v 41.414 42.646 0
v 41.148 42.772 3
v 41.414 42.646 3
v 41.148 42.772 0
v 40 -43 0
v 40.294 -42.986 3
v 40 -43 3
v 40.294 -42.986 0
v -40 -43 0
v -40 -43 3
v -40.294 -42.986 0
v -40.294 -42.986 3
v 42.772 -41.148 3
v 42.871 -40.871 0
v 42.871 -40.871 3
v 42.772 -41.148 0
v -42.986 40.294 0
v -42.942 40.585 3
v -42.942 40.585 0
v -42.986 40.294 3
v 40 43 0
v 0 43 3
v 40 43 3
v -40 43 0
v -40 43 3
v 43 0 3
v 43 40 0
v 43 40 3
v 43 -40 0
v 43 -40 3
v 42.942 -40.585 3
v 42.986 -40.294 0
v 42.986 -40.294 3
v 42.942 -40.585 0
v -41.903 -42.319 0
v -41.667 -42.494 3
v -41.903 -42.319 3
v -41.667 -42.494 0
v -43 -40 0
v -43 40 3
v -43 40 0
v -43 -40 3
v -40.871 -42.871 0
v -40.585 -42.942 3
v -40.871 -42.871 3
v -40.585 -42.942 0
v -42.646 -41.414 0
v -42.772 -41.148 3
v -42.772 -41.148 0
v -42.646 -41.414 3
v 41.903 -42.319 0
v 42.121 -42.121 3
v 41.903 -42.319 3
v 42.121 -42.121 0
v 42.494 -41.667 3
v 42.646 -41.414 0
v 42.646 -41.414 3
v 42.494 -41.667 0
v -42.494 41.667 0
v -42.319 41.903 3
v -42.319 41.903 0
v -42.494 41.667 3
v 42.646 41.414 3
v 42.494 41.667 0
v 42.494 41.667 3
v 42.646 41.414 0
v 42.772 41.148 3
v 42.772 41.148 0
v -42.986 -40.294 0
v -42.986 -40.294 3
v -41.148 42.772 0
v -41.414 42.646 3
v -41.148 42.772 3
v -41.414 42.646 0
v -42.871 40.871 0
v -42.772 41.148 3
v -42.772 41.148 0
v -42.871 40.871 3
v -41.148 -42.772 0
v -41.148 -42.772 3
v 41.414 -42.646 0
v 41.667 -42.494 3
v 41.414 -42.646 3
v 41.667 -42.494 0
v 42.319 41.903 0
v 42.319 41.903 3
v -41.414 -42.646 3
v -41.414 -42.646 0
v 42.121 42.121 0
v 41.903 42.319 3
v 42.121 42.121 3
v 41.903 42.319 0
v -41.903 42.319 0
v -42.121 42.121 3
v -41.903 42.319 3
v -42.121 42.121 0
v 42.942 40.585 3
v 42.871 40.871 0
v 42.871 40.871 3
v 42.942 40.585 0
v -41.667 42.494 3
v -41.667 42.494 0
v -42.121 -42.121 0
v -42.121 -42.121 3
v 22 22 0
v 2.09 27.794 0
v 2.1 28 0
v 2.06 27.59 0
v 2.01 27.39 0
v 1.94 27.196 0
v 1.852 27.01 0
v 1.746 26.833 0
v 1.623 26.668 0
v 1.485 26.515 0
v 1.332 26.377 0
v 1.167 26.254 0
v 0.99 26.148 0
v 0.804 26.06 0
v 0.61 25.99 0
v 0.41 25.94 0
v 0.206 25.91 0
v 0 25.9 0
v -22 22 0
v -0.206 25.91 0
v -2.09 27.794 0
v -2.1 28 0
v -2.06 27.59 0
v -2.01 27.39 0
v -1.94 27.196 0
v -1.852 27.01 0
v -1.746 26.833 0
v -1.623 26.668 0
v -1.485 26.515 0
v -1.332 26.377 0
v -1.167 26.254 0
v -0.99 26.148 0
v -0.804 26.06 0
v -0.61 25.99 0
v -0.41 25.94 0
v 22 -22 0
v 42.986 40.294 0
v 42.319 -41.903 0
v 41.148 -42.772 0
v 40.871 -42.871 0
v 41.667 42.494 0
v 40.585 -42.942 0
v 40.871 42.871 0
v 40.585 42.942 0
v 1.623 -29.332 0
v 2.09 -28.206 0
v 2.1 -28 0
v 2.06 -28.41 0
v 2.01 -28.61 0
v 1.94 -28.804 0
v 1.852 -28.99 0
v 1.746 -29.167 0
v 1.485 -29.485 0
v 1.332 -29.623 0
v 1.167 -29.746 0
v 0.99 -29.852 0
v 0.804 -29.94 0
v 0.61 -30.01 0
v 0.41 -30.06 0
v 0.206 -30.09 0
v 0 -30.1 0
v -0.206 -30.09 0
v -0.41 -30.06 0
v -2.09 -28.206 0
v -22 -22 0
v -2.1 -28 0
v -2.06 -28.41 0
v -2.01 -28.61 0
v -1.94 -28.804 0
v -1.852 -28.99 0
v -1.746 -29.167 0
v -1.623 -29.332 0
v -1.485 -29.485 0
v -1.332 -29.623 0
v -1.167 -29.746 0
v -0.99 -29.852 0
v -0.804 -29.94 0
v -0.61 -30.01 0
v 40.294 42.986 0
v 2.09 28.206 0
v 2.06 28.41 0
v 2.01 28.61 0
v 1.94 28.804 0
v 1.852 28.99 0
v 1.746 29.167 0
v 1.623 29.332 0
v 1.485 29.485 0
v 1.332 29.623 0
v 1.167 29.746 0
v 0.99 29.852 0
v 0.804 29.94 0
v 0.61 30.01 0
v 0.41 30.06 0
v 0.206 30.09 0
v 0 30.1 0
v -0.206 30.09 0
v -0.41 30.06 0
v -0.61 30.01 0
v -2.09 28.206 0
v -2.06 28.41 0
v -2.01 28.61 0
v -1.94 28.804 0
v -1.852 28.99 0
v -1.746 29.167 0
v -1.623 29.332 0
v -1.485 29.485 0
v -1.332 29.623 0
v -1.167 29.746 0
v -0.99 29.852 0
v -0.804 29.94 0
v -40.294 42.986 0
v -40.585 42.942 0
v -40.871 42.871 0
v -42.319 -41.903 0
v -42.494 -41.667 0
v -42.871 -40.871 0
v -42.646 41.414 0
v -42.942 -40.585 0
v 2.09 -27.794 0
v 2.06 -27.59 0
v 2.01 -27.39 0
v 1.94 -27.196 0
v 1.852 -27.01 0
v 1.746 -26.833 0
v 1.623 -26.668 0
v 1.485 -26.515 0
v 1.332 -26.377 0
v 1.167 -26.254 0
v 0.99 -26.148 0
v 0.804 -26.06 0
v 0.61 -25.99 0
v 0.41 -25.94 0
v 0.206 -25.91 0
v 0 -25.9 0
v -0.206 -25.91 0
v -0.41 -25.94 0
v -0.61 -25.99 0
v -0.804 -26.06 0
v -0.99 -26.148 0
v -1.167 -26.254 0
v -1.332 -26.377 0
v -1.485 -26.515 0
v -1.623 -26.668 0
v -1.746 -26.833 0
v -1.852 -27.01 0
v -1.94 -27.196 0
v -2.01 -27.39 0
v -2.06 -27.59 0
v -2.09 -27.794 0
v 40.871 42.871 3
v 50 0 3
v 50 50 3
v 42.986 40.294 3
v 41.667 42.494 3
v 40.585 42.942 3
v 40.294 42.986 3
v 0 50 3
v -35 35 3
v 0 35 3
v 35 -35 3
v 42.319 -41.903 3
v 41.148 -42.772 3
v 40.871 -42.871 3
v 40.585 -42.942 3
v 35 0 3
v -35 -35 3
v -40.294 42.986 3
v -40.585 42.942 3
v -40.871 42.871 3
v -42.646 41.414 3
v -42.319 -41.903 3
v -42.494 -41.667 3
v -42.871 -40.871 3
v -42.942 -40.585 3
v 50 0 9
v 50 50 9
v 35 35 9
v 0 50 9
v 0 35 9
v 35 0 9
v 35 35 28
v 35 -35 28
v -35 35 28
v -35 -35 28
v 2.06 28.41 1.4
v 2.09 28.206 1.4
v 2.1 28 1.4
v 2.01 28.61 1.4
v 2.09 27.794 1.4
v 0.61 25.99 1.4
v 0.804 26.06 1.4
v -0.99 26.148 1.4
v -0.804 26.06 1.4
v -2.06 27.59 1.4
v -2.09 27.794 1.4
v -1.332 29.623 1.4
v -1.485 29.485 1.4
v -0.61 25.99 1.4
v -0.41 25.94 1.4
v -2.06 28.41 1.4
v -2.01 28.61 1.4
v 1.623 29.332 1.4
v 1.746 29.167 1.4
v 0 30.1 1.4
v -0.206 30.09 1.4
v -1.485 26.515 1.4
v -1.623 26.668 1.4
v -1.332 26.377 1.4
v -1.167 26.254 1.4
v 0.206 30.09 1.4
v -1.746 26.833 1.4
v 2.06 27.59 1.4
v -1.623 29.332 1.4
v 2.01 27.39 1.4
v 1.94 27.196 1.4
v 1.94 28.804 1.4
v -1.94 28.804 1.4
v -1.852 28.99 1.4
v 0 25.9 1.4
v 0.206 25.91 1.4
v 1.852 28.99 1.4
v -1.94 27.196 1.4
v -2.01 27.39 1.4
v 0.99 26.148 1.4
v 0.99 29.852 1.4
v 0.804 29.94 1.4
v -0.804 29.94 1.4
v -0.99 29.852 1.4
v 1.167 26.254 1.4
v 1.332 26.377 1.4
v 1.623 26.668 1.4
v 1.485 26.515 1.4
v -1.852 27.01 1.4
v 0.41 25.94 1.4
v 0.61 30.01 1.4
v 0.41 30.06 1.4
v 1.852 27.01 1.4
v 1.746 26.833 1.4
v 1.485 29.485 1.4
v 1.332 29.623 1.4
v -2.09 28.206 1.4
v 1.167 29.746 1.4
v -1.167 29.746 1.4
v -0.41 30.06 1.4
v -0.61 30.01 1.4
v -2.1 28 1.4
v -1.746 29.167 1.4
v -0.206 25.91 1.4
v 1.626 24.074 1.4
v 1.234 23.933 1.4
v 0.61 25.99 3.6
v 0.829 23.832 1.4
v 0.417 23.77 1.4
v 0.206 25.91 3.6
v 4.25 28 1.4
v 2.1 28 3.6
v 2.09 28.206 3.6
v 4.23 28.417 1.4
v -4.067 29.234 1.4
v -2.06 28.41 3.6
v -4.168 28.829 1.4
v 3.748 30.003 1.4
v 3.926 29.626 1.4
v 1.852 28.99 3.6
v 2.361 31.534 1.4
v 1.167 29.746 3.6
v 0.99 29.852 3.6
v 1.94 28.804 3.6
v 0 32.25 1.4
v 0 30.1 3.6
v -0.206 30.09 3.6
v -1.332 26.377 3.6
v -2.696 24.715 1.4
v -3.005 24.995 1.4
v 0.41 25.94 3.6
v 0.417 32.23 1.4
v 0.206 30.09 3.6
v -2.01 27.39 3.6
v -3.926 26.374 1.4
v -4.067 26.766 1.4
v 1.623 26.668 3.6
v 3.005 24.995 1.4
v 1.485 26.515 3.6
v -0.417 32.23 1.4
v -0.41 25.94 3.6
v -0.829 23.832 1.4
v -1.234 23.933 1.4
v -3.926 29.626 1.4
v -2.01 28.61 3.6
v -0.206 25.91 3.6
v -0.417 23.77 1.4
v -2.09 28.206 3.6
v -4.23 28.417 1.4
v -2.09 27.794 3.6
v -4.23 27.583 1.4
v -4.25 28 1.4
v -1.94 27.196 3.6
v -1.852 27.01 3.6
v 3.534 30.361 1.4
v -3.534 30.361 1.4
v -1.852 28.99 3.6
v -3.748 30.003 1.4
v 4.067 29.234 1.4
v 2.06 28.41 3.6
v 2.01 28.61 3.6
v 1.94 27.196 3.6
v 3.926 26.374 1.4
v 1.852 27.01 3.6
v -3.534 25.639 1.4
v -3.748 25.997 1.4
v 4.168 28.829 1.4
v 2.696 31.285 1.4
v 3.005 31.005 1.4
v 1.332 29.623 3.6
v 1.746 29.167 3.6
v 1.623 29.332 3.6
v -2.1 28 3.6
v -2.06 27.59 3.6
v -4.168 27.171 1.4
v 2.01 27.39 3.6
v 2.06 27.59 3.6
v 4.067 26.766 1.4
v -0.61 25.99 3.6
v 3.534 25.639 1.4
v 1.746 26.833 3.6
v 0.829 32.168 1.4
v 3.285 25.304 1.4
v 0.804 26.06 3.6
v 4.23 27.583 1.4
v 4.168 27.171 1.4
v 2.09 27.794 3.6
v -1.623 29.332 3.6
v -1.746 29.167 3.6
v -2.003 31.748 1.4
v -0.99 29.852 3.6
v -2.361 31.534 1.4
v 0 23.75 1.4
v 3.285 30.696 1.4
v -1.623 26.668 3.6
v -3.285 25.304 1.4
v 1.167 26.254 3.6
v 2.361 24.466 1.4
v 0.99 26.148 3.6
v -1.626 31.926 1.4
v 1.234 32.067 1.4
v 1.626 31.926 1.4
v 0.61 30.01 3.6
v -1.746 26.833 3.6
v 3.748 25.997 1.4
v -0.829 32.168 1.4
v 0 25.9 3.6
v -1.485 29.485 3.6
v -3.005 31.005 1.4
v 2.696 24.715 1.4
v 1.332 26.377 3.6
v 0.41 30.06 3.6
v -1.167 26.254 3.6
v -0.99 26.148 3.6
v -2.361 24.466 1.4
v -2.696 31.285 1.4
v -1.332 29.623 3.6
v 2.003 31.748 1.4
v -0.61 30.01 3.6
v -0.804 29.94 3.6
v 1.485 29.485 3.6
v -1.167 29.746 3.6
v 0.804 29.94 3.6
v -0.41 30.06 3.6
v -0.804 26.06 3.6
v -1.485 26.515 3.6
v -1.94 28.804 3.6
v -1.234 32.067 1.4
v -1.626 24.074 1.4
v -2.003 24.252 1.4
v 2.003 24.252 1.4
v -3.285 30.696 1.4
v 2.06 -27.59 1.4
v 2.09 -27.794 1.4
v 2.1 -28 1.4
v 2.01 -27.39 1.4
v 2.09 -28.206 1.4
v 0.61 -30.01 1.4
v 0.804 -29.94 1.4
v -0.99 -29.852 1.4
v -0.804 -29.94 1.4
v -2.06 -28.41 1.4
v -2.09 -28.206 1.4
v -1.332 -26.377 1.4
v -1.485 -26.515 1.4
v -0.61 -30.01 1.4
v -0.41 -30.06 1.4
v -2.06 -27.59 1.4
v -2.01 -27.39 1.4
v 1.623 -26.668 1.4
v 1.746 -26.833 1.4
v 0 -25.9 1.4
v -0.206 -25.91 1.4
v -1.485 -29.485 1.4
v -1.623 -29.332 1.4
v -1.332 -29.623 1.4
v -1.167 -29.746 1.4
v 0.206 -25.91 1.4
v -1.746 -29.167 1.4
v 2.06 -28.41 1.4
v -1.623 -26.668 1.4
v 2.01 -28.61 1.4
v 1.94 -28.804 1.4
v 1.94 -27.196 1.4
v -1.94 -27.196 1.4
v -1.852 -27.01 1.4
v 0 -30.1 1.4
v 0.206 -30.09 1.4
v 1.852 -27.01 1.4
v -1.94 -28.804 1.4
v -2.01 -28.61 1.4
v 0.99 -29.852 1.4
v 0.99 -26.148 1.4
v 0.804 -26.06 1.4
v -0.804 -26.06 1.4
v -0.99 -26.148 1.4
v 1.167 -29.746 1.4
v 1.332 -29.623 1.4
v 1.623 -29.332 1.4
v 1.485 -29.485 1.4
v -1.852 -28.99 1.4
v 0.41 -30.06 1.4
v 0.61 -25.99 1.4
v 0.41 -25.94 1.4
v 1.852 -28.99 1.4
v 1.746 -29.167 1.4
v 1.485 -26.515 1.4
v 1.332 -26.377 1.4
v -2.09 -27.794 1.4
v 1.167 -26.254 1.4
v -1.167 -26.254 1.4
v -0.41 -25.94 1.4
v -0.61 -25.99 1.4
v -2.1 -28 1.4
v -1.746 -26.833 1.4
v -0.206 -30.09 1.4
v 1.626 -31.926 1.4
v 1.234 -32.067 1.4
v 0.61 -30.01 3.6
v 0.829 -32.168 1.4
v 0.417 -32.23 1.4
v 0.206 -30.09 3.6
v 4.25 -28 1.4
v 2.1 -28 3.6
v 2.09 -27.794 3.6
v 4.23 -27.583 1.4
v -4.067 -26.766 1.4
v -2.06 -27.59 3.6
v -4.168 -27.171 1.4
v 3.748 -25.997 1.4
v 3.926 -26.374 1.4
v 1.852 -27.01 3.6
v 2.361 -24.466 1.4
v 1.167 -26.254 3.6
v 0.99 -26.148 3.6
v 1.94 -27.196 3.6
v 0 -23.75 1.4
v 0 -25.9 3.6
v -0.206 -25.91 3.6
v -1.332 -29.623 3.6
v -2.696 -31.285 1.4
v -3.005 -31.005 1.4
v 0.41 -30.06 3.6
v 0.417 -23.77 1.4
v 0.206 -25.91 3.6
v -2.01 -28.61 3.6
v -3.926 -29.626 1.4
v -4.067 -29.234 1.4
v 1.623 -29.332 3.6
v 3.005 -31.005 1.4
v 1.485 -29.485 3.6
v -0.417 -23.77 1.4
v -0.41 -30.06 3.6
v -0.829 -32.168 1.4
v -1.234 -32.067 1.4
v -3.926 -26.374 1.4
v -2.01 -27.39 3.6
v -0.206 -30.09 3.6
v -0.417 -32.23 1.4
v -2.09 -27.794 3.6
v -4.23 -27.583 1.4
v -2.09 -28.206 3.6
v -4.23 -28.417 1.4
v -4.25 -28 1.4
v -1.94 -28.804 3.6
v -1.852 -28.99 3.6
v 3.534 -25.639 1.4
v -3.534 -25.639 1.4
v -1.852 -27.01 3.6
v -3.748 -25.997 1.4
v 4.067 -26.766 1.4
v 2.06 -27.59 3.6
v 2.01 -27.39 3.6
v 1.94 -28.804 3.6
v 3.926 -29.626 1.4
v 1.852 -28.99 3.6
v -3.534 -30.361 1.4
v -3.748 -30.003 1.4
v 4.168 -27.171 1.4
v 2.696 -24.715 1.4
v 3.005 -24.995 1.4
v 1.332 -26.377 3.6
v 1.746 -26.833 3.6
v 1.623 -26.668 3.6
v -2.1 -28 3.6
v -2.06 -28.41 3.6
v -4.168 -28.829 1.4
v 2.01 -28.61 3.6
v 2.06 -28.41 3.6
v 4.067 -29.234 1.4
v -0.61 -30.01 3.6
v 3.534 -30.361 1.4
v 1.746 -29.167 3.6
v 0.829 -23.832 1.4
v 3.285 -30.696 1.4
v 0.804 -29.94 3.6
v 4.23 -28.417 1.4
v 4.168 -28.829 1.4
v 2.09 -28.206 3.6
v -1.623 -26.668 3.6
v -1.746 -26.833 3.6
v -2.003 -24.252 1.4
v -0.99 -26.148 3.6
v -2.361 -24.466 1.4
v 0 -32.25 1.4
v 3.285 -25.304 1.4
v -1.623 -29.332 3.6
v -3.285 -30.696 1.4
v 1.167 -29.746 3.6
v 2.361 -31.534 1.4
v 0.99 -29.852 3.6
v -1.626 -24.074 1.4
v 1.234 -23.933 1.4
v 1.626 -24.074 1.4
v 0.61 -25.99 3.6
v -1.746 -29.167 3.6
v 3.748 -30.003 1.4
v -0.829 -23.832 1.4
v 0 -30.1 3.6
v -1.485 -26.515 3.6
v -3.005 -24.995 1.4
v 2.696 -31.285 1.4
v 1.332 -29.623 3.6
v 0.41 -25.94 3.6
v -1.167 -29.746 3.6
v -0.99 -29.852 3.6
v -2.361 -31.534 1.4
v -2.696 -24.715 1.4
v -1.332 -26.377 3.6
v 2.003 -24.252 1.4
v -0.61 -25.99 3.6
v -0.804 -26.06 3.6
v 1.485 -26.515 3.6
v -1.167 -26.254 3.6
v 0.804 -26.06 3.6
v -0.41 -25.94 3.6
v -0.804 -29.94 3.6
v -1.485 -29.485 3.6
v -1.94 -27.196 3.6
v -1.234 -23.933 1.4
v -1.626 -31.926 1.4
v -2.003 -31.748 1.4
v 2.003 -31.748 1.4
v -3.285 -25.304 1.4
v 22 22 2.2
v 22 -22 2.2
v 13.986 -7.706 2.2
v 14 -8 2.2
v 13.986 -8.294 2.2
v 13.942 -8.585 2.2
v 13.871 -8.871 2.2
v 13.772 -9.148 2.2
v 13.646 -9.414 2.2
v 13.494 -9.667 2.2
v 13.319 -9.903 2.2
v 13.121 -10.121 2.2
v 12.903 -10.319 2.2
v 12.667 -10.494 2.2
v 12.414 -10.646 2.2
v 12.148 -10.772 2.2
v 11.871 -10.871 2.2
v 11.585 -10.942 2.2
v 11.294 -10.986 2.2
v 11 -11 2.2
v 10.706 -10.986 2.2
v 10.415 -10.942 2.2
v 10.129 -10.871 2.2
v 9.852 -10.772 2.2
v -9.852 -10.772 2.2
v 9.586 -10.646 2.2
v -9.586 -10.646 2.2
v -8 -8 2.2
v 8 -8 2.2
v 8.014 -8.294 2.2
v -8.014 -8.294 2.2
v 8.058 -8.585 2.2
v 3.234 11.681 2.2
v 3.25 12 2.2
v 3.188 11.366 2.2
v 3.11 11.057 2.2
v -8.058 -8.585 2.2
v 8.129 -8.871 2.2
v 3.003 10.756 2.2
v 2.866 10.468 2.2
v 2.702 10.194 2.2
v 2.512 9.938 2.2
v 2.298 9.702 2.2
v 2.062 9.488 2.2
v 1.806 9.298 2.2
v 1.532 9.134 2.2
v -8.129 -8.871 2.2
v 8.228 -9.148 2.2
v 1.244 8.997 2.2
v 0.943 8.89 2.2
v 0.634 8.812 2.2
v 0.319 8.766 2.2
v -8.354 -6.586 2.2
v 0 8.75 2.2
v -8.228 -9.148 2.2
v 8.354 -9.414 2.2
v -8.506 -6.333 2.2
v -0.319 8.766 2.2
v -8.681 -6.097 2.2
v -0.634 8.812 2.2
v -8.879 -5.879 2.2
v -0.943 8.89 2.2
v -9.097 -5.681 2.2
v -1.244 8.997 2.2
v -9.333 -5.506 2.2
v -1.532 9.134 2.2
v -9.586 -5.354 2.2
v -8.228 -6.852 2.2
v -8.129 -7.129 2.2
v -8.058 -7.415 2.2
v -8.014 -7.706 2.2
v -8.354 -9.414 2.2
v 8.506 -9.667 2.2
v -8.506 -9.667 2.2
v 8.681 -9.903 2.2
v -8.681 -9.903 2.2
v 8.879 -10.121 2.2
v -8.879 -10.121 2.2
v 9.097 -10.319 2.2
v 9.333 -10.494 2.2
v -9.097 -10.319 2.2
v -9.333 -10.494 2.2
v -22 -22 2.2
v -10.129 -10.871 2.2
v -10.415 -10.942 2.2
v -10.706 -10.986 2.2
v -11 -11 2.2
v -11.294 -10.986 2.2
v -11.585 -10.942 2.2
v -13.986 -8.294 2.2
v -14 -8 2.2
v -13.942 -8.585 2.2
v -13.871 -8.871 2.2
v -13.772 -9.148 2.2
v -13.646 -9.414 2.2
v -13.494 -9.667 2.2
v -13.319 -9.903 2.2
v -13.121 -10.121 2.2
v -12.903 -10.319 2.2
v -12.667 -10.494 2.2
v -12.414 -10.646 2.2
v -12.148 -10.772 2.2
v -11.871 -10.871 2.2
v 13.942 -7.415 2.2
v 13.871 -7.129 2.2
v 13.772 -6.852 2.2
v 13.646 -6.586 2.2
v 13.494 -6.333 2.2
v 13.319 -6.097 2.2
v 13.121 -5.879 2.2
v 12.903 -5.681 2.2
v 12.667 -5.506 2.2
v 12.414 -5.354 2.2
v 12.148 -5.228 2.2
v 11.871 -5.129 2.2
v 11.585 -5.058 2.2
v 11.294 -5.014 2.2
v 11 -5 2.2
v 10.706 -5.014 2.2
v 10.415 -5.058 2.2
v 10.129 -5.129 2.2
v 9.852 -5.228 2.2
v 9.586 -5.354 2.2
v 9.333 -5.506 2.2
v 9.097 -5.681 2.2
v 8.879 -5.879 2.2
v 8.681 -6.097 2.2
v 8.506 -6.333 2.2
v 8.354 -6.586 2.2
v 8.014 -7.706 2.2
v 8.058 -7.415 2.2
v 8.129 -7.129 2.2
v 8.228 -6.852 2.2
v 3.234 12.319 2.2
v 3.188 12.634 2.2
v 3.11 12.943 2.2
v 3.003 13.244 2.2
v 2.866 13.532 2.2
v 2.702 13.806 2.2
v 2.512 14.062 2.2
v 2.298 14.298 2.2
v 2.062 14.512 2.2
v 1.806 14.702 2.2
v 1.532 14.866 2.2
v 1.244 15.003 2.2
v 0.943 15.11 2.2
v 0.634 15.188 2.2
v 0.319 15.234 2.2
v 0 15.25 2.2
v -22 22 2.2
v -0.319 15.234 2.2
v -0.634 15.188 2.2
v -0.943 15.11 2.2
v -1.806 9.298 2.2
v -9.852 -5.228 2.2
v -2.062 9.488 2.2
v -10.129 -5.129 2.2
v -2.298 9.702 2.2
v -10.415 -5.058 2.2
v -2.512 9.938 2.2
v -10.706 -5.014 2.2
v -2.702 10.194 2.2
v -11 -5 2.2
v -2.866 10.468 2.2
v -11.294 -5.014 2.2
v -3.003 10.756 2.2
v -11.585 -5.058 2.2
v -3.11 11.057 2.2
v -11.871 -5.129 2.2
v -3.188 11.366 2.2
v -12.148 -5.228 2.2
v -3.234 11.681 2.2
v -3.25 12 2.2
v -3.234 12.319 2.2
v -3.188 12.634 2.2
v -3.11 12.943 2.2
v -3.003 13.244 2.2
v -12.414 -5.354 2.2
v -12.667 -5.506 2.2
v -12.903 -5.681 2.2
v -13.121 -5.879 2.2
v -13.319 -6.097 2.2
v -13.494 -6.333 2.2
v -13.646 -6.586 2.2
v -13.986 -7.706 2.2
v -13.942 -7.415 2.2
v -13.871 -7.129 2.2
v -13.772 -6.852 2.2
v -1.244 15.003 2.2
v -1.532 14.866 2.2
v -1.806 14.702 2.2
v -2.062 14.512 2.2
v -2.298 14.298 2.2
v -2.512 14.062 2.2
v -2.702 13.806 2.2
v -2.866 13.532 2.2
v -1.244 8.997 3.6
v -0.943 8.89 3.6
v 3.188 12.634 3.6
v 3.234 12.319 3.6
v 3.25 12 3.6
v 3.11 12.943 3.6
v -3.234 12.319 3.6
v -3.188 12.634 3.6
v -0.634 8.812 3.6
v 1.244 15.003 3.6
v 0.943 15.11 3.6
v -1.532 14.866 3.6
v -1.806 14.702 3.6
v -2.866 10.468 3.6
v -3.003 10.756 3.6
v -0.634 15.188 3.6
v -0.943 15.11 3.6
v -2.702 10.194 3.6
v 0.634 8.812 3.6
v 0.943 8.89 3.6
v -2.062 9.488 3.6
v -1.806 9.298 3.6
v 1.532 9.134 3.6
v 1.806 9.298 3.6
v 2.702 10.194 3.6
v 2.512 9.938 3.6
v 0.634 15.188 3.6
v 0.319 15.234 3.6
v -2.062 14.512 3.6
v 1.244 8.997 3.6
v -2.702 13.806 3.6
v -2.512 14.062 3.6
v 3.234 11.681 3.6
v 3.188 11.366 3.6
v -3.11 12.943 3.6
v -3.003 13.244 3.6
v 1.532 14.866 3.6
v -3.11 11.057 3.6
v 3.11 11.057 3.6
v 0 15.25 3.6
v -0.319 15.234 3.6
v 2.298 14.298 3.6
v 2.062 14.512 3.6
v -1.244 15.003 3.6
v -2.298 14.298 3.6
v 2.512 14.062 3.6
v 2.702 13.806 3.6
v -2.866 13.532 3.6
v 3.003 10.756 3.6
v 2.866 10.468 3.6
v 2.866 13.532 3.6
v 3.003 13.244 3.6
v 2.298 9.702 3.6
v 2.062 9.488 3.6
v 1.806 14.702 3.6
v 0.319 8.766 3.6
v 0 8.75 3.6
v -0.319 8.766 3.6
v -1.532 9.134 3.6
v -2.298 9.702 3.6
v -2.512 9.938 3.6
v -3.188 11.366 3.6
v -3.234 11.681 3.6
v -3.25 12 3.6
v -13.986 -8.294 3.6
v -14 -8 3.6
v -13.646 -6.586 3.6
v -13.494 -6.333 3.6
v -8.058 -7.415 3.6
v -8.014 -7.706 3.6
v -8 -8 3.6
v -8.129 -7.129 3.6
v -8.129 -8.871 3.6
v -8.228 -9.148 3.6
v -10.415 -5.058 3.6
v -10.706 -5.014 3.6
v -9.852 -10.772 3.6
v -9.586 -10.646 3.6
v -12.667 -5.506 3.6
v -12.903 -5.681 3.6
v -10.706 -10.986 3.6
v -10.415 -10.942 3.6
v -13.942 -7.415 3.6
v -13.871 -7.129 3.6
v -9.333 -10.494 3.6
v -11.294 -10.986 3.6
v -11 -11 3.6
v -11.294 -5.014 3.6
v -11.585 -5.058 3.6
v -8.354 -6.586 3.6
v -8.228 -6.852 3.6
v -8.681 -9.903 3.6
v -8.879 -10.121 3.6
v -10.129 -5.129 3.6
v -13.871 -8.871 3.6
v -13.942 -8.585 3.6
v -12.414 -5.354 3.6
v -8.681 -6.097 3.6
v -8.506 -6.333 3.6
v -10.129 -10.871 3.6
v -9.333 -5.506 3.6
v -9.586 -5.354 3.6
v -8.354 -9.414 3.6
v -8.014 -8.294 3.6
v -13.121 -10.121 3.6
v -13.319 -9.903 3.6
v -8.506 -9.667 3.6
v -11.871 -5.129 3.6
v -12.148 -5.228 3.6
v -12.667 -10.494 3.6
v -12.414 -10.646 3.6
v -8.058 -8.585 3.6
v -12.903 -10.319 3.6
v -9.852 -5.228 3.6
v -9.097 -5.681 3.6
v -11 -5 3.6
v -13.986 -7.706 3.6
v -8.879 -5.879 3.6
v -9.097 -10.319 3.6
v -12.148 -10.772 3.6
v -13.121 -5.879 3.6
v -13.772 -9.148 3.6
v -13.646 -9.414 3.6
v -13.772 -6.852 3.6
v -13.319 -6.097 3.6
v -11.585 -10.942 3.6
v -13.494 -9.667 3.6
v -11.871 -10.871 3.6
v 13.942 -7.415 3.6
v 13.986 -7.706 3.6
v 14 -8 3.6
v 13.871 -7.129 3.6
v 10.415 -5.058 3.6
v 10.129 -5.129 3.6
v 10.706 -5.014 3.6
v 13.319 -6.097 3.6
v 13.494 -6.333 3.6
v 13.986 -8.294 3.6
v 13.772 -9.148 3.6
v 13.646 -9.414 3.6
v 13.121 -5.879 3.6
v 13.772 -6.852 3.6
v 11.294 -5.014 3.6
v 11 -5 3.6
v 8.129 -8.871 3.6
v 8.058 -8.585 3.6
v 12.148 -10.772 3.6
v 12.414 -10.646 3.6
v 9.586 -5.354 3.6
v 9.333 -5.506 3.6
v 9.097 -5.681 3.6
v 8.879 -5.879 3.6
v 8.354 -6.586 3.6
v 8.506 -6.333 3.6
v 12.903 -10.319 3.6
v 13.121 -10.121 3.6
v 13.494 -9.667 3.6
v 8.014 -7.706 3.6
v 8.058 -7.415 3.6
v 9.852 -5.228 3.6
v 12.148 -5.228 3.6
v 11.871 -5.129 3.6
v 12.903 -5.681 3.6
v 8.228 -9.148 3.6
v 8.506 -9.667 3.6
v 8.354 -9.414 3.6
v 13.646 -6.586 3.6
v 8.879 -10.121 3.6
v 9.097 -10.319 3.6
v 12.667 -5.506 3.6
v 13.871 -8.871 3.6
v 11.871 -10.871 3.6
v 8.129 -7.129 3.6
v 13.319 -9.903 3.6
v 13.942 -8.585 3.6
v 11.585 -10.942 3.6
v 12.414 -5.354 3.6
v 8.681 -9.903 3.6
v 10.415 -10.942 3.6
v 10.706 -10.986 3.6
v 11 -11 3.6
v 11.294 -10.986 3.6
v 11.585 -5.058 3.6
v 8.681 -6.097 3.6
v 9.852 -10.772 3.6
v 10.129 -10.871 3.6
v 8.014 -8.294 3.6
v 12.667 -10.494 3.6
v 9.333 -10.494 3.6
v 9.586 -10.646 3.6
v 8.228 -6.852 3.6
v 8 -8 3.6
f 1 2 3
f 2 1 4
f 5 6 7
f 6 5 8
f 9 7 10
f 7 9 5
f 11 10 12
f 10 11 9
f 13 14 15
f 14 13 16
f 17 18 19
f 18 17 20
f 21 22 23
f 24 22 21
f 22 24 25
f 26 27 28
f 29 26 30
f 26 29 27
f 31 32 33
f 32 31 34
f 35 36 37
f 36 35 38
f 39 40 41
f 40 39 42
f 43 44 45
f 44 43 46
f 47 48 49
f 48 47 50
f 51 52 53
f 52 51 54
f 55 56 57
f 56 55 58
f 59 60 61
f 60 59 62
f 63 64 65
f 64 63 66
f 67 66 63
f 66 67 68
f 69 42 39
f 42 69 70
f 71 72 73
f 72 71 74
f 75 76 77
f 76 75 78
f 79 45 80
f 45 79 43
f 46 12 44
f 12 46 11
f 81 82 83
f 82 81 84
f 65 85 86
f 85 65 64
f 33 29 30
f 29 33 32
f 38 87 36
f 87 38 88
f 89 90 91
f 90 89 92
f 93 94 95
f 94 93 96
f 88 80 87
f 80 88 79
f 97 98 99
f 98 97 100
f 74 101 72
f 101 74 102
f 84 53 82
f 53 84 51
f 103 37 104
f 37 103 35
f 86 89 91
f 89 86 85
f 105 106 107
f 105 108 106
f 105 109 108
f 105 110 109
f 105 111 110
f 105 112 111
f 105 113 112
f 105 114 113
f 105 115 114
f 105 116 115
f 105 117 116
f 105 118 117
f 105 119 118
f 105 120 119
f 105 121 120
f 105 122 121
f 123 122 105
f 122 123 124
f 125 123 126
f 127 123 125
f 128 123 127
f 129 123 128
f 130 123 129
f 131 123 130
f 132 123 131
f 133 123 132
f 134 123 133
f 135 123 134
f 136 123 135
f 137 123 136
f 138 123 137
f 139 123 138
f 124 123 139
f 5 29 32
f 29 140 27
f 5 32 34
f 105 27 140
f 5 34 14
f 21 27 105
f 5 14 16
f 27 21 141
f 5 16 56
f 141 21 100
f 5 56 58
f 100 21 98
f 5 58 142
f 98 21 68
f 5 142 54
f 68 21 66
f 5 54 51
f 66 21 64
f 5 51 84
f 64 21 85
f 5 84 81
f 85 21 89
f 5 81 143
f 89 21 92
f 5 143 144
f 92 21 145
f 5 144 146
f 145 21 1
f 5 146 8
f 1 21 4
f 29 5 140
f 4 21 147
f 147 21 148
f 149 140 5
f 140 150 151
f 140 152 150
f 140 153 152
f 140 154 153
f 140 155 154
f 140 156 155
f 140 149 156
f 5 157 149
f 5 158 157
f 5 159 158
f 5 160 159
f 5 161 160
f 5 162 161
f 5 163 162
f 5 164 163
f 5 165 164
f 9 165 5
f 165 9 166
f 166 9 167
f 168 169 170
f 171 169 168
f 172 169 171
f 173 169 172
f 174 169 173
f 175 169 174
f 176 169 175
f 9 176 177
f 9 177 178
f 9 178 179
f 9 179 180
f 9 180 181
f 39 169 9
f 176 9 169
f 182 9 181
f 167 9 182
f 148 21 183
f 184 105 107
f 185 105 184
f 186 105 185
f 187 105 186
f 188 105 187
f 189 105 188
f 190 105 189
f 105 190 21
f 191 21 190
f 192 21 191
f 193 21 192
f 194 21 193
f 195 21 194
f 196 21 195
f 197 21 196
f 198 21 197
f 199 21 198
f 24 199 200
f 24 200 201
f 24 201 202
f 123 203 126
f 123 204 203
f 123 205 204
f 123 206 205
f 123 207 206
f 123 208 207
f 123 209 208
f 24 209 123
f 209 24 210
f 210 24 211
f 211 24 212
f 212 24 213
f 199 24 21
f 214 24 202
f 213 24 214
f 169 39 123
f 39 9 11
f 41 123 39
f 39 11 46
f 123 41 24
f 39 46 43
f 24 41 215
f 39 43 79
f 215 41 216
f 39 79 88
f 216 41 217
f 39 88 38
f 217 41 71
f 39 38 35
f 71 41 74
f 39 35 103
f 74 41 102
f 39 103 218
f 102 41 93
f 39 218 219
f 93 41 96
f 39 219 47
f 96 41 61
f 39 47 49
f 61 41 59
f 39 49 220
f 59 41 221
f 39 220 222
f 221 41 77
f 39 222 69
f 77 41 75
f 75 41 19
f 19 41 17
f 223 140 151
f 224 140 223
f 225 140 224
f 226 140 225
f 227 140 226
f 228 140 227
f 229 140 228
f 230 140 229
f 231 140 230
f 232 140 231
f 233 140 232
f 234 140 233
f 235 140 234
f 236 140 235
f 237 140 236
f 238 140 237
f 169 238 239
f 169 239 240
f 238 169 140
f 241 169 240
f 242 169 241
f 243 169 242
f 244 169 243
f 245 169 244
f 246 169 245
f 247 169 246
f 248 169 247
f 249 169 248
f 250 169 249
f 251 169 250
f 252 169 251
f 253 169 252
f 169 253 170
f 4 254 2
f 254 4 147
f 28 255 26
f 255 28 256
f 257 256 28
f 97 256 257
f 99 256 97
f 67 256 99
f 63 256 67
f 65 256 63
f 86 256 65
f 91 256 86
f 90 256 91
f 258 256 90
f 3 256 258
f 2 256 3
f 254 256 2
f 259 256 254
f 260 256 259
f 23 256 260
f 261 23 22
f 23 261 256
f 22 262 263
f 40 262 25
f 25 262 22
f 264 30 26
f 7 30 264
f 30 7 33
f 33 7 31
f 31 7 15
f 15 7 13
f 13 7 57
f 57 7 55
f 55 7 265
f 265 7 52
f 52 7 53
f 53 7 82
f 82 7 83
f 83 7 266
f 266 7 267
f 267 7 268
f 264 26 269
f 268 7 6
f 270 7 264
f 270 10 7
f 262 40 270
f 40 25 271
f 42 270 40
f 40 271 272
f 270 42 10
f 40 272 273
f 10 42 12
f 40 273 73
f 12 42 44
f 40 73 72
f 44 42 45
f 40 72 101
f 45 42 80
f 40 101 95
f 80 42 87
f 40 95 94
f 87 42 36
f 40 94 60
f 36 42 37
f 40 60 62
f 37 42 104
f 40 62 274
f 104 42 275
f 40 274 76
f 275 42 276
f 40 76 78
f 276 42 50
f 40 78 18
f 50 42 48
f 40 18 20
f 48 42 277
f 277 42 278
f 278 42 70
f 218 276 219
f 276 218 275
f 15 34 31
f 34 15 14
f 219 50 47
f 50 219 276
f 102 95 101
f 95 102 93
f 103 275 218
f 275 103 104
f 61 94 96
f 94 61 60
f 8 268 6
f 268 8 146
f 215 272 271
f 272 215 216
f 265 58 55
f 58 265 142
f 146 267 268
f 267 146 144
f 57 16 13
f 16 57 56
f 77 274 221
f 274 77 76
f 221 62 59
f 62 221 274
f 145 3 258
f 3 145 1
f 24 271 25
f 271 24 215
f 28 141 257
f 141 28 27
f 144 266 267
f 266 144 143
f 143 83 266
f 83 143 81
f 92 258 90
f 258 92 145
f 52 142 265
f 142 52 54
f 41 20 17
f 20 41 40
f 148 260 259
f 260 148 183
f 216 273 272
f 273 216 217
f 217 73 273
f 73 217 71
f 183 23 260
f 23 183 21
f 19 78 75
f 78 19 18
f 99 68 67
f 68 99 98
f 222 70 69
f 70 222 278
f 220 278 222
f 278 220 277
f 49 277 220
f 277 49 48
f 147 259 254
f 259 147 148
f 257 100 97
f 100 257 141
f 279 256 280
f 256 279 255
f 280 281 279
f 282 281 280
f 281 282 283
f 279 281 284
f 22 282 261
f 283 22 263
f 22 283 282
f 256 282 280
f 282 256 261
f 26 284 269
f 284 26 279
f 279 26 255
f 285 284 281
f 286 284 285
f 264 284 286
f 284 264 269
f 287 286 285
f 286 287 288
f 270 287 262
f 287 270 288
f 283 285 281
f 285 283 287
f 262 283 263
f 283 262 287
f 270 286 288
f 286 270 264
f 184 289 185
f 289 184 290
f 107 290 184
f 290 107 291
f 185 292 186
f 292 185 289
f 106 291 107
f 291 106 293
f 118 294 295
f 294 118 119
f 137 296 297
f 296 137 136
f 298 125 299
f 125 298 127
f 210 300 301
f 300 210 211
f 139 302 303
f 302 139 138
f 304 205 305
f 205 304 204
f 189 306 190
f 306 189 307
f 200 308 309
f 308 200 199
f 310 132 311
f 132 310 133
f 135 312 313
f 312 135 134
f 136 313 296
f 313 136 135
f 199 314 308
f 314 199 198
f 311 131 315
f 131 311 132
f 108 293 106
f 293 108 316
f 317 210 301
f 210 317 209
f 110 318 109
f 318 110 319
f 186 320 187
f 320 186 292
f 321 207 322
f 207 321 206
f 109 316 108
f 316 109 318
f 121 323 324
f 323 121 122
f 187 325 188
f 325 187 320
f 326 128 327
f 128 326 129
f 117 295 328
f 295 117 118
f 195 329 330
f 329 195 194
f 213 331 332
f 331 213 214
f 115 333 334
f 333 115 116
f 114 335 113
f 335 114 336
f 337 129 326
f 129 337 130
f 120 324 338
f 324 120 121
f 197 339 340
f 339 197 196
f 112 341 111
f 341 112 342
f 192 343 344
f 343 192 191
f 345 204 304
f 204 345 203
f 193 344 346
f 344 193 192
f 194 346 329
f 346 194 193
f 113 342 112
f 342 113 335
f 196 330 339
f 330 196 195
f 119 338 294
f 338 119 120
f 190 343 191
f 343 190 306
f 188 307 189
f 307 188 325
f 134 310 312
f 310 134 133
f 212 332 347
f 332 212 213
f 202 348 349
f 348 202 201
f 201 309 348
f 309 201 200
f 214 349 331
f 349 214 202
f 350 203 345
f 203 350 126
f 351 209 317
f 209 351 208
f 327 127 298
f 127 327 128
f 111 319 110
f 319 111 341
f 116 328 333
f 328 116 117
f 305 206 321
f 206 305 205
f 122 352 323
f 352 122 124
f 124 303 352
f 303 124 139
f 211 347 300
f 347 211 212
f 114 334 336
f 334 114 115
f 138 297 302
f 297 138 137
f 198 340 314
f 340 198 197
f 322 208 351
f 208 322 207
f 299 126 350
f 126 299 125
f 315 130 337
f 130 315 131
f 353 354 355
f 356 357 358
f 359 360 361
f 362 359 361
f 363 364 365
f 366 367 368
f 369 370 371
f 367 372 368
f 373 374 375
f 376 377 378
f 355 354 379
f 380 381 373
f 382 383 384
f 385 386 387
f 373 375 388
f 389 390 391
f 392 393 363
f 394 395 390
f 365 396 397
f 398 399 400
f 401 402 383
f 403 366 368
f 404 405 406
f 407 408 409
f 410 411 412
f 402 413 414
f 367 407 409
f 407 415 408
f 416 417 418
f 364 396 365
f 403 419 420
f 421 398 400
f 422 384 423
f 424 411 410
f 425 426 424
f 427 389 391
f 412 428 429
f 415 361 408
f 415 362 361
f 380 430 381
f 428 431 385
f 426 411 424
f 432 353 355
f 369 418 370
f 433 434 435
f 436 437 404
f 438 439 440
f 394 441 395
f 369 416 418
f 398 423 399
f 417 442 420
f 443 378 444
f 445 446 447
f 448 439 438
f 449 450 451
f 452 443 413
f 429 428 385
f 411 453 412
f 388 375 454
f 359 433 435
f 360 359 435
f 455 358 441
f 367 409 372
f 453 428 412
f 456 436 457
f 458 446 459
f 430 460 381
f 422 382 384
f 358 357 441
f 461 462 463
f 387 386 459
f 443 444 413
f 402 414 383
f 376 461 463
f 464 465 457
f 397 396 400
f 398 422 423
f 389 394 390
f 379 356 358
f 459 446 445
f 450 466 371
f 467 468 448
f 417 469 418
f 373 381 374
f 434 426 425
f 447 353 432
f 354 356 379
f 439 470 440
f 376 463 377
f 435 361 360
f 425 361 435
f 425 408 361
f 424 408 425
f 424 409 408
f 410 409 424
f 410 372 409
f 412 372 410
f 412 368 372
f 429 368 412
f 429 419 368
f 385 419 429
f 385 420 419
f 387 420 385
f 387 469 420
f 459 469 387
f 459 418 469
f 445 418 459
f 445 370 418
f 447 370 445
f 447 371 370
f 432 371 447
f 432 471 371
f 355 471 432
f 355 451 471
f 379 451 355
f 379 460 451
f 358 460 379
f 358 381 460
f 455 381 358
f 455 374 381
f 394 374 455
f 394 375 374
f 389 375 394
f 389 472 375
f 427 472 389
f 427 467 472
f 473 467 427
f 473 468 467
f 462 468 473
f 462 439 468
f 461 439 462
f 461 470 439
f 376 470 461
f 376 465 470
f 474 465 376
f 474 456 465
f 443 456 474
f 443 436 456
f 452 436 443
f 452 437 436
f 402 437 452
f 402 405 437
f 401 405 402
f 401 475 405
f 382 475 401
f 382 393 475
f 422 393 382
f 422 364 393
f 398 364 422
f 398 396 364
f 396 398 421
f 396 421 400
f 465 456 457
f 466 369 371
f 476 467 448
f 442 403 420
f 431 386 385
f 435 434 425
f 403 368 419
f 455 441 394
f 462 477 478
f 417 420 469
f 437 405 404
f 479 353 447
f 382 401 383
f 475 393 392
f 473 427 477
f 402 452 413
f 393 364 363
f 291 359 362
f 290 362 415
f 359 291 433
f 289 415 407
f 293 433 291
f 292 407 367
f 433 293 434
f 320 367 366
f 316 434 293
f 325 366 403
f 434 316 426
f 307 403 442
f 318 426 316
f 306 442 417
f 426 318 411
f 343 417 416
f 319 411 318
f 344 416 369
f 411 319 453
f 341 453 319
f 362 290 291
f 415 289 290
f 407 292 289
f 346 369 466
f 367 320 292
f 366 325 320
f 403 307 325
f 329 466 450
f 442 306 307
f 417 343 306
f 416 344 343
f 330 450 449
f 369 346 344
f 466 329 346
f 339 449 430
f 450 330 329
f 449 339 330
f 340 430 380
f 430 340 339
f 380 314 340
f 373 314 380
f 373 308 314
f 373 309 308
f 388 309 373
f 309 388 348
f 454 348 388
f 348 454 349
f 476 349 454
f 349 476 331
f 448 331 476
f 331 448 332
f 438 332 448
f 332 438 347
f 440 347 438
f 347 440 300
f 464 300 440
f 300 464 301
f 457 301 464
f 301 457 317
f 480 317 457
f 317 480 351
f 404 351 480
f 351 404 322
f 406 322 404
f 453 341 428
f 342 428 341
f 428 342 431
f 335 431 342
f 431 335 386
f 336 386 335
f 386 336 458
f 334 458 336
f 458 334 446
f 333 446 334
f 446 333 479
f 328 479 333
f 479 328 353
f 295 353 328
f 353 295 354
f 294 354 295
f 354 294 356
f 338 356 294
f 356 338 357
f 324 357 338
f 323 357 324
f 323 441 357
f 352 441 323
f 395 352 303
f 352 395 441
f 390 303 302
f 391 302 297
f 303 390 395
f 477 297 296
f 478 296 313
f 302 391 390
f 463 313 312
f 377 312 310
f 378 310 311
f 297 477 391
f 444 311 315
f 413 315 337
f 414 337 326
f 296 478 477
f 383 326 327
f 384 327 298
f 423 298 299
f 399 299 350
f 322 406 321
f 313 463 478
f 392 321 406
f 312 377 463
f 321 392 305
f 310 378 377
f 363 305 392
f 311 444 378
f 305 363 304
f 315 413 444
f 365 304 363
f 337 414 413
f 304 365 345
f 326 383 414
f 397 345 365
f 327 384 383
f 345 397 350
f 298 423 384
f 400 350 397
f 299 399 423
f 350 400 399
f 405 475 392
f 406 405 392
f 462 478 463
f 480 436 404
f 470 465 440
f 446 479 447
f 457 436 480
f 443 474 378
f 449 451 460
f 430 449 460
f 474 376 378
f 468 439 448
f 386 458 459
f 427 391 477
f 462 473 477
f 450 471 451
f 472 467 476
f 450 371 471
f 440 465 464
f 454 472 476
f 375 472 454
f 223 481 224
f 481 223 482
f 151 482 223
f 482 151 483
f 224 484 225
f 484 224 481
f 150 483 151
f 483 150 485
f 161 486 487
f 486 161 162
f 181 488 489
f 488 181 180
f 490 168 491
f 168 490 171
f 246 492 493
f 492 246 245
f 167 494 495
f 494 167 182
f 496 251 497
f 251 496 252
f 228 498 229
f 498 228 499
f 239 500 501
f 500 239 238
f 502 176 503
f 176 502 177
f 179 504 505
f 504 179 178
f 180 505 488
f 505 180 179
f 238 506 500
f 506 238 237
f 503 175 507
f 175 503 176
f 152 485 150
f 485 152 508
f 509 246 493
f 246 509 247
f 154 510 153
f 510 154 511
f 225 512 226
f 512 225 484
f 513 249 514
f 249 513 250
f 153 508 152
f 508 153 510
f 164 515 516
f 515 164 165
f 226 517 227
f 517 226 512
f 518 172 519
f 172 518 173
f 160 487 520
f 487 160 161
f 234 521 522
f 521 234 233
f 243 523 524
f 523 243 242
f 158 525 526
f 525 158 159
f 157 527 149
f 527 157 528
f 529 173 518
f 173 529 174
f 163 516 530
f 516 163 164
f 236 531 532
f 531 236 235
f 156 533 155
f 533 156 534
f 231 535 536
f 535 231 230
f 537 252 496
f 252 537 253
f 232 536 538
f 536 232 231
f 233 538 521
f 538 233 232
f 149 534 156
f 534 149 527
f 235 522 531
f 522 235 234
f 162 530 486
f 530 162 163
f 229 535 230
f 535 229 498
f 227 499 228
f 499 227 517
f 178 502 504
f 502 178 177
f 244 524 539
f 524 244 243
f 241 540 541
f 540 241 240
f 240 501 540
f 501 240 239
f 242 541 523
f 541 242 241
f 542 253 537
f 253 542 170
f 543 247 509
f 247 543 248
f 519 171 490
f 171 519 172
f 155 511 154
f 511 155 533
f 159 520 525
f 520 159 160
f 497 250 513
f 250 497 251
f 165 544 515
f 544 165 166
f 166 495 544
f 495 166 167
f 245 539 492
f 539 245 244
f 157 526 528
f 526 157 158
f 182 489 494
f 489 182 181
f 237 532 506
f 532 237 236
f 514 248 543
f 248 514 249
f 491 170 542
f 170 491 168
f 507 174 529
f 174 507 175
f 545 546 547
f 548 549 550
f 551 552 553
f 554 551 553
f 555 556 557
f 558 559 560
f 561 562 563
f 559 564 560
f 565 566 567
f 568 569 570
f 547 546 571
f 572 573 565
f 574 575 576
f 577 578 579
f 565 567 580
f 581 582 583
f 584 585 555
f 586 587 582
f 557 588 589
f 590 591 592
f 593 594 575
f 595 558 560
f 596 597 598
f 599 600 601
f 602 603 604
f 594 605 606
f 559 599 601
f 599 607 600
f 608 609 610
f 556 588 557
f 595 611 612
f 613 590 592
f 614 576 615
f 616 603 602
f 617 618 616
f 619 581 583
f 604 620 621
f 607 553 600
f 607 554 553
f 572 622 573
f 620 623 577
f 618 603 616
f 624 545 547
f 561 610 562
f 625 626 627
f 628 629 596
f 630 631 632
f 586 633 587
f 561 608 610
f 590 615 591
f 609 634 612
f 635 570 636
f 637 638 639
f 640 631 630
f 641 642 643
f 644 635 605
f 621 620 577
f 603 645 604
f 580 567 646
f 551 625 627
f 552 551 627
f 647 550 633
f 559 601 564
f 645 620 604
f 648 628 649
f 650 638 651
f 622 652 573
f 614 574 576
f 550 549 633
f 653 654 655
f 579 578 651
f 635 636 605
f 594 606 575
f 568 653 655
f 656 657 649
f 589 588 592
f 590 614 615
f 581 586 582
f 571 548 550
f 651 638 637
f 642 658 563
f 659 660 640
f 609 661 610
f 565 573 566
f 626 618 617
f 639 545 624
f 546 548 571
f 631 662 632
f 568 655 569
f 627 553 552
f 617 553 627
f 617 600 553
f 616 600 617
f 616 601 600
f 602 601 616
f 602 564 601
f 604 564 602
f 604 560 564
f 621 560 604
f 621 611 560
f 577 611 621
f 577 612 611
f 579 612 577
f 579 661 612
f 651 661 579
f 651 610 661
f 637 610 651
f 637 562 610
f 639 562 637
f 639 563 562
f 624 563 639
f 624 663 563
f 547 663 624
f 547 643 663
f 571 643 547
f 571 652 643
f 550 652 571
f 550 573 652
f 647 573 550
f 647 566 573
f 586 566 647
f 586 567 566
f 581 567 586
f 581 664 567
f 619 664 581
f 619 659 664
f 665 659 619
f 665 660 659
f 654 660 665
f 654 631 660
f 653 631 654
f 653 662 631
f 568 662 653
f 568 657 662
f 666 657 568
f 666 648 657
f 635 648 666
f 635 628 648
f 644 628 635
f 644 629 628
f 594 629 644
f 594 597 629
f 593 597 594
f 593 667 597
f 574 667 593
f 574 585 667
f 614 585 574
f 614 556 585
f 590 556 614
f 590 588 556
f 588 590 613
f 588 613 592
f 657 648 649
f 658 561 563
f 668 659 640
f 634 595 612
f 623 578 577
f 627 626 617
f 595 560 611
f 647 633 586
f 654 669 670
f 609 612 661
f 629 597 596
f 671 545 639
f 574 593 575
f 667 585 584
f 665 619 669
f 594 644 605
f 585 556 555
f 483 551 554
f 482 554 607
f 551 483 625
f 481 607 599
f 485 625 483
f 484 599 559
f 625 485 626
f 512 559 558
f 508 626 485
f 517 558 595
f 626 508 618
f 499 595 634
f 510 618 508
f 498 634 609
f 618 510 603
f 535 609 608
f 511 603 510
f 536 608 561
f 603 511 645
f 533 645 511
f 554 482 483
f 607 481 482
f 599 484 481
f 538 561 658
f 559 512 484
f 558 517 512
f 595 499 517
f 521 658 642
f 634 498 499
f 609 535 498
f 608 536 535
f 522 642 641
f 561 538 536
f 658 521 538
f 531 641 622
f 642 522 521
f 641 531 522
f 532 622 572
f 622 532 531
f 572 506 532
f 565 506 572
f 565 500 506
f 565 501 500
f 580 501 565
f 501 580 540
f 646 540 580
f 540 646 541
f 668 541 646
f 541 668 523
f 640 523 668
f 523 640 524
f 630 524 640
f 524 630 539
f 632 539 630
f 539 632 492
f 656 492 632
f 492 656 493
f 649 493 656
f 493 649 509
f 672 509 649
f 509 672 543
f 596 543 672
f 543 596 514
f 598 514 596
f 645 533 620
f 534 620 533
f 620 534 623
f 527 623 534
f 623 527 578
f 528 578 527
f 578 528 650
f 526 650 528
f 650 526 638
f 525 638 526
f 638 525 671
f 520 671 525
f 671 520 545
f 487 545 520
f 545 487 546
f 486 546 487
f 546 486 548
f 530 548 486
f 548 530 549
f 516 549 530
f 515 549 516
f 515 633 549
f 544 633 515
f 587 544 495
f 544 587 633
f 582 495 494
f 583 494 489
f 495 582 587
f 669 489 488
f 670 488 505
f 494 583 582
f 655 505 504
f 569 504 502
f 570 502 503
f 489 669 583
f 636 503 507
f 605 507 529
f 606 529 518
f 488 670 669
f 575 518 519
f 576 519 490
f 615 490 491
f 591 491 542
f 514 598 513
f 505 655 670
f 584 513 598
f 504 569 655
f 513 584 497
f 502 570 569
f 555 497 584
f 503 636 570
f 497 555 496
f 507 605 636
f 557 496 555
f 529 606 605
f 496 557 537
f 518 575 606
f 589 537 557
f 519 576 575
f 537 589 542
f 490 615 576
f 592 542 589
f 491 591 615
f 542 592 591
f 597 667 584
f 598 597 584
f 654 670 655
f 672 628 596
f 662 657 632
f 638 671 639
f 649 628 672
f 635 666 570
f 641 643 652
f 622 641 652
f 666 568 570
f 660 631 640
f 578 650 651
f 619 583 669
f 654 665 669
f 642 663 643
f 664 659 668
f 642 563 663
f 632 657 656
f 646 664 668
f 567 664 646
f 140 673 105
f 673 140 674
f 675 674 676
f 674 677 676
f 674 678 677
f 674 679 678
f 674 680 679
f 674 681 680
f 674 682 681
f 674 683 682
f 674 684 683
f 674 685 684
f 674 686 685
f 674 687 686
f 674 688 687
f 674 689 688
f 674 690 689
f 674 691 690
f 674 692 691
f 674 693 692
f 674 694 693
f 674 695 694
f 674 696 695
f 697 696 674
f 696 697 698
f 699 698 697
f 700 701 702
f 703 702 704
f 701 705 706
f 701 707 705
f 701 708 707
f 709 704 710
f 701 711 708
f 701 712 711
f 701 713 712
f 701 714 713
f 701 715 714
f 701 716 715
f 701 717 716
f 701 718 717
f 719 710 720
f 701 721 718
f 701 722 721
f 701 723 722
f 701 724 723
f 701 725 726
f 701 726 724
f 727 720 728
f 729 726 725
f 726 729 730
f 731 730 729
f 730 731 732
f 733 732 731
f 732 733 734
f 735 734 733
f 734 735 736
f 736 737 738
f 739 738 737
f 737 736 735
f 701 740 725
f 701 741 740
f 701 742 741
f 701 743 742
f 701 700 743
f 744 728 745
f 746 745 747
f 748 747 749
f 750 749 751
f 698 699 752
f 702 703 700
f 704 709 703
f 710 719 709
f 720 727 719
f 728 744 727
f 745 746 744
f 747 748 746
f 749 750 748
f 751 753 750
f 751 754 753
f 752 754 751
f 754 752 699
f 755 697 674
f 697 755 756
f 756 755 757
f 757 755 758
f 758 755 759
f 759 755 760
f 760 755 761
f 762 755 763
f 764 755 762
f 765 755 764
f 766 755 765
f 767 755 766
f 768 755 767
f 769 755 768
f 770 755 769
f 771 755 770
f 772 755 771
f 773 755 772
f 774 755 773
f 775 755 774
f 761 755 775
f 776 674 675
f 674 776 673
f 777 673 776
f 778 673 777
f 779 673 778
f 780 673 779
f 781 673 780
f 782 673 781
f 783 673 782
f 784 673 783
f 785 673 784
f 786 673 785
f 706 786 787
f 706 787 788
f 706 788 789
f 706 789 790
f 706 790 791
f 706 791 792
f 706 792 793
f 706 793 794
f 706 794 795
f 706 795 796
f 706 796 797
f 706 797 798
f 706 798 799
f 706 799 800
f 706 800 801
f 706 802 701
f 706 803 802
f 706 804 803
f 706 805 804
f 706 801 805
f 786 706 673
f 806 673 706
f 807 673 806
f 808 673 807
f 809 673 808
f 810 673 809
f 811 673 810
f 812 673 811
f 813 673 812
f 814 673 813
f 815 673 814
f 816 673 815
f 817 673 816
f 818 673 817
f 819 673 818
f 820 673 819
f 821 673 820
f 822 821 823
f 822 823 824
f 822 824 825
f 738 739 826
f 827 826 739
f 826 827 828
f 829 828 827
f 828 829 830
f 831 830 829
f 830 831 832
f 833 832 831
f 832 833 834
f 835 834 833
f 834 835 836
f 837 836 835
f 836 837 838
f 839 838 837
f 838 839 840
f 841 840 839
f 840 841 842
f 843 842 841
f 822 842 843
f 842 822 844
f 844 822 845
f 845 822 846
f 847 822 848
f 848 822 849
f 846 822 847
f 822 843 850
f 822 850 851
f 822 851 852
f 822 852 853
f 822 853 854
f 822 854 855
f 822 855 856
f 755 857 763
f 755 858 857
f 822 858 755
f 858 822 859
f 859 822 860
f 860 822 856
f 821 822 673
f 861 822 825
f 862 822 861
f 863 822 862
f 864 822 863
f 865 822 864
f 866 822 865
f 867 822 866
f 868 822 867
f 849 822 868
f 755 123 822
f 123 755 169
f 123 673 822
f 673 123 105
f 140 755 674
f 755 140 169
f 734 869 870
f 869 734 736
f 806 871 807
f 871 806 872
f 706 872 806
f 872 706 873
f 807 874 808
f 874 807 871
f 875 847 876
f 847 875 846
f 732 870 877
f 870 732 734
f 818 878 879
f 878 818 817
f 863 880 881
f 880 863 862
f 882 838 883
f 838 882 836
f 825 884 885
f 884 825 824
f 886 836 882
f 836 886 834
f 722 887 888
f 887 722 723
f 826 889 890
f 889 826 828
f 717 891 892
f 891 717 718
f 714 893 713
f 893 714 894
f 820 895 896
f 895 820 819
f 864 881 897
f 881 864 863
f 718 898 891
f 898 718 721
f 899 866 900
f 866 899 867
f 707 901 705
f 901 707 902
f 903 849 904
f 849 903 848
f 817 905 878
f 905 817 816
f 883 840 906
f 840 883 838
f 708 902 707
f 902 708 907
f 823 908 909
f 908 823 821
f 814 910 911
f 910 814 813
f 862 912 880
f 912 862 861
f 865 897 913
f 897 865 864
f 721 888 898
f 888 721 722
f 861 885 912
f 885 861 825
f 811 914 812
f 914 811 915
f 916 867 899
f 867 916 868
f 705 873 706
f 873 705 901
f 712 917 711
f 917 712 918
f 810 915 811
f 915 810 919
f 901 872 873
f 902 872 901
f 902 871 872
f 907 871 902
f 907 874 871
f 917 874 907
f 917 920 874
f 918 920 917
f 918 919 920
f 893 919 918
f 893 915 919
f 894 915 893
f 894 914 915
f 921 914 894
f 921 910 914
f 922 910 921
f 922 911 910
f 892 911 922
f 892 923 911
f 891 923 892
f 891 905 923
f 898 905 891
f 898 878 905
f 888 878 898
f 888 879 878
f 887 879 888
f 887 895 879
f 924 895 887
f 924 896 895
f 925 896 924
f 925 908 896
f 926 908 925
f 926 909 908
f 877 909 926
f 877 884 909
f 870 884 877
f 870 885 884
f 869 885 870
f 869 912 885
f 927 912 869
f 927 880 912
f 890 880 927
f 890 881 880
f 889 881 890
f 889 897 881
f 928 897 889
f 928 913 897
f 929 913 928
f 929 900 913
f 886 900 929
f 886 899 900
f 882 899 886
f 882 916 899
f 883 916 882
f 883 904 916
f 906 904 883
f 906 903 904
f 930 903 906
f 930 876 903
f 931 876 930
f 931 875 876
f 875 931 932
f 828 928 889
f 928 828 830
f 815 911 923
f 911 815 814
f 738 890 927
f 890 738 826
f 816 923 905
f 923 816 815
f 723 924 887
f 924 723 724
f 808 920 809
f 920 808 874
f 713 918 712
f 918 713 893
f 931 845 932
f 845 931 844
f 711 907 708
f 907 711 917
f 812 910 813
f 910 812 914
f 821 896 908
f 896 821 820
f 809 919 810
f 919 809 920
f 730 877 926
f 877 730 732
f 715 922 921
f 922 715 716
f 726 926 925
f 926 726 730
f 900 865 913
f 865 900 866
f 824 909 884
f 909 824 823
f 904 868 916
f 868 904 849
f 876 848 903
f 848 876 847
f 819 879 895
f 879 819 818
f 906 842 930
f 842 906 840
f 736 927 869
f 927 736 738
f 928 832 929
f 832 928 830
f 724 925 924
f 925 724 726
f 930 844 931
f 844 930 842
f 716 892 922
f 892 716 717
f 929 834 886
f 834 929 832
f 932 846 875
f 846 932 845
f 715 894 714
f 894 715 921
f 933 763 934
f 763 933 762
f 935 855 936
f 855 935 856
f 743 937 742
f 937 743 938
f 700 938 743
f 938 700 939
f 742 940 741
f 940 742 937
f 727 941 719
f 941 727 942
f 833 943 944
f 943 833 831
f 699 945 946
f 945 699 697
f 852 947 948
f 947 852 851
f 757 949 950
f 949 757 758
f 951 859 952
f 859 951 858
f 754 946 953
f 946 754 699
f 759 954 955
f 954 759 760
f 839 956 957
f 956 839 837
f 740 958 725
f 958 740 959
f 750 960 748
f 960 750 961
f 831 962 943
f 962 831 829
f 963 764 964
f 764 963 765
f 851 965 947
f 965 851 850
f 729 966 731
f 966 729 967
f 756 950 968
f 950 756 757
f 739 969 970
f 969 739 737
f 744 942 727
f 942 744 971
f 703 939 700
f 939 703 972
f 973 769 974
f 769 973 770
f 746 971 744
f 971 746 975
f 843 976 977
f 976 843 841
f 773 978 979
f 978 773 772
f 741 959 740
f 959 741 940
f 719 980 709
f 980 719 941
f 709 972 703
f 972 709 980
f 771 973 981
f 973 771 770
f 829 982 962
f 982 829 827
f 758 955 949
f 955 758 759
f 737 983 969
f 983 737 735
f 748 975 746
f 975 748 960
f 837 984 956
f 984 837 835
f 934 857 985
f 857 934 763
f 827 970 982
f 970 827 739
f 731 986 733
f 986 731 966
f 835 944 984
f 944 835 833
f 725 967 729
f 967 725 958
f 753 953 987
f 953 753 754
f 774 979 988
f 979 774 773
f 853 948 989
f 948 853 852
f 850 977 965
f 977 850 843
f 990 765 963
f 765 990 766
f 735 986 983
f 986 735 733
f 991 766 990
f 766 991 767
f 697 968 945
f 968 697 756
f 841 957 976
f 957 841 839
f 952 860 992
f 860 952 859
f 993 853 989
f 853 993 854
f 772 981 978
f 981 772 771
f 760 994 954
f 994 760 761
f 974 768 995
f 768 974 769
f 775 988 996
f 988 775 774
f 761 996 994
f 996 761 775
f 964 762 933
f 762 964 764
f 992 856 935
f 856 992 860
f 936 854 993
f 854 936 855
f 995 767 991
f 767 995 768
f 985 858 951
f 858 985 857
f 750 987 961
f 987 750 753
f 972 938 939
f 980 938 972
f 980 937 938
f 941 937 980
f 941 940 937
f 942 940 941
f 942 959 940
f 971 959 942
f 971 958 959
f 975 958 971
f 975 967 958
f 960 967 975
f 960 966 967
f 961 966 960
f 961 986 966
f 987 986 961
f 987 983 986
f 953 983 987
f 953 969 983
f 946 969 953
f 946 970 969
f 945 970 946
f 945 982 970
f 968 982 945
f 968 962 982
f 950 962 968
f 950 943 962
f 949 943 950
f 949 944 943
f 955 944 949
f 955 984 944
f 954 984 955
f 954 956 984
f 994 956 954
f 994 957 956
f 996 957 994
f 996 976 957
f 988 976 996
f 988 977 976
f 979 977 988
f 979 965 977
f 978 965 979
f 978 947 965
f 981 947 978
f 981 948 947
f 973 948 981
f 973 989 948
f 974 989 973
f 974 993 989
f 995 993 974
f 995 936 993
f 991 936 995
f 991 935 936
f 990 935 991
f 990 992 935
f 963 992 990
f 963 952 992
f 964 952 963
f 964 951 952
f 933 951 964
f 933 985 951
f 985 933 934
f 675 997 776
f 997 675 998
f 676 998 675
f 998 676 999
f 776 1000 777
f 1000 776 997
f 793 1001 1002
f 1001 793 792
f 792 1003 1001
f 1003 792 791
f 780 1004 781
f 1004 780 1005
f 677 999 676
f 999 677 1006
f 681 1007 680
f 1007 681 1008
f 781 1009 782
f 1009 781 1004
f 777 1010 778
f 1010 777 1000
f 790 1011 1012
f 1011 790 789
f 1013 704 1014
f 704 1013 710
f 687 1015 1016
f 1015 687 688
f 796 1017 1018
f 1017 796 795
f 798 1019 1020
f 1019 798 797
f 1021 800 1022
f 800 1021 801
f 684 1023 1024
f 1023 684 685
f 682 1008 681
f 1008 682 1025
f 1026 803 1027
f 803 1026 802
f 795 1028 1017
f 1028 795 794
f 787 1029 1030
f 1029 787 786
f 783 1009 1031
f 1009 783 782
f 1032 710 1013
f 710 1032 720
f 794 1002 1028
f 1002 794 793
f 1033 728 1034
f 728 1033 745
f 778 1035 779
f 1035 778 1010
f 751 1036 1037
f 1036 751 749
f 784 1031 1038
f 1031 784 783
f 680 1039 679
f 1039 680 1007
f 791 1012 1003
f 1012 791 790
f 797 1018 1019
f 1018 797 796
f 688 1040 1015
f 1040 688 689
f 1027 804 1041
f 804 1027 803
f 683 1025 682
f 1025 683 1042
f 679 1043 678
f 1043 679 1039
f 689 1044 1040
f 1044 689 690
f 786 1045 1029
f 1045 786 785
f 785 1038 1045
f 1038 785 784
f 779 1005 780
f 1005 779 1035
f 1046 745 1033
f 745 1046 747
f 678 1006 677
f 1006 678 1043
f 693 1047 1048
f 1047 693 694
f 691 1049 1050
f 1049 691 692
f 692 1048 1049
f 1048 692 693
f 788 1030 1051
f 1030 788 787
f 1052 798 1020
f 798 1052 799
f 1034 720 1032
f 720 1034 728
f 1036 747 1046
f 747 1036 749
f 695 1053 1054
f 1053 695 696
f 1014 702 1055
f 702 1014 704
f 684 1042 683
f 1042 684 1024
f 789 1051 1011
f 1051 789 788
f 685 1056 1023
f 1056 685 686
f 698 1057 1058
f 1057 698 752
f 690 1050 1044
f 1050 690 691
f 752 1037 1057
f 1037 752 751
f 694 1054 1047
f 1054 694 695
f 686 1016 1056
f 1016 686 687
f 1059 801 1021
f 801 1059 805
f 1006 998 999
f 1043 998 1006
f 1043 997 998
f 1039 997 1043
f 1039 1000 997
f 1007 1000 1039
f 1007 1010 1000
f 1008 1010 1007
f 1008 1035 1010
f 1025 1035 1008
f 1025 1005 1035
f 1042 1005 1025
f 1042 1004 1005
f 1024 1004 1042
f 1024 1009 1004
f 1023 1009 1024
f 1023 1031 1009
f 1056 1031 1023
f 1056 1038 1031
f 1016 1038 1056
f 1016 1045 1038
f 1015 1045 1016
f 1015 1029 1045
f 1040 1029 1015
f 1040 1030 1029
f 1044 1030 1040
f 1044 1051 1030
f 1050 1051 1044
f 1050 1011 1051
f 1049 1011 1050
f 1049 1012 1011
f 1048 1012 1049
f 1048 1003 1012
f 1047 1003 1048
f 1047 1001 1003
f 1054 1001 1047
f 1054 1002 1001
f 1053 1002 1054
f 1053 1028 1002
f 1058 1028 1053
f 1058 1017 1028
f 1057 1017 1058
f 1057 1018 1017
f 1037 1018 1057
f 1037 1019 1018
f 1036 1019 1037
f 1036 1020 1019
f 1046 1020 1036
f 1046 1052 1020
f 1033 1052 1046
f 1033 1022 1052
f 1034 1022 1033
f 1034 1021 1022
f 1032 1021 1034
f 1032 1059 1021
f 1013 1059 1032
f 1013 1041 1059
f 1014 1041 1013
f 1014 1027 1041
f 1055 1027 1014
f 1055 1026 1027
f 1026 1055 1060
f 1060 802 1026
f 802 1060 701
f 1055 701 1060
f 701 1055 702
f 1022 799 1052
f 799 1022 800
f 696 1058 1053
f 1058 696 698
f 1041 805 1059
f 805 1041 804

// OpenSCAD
$fn=64;

plate_w = 86;
plate_h = 86;
plate_t = 3;

backbox_w = 70;
backbox_h = 70;
backbox_d = 25;

face_r = 3;

socket_body_w = 50;
socket_body_h = 50;
socket_body_t = 6;

recess_w = 44;
recess_h = 44;
recess_d = 2.2;

earth_d = 6.5;
live_d = 6.0;
pin_depth = 6;

pin_spacing = 22.0;
earth_offset_y = 12.0;
live_offset_y = -8.0;

screw_hole_d = 4.2;
screw_csk_d = 8.5;
screw_csk_h = 1.6;
screw_offset_y = 28;

module rounded_plate(w,h,t,r){
    hull(){
        for (sx=[-1,1], sy=[-1,1])
            translate([sx*(w/2-r), sy*(h/2-r), 0])
                cylinder(h=t, r=r);
    }
}

module screw_hole(){
    union(){
        cylinder(h=plate_t+0.5, d=screw_hole_d);
        translate([0,0,plate_t - screw_csk_h])
            cylinder(h=screw_csk_h+0.6, d1=screw_csk_d, d2=screw_hole_d);
    }
}

module pin_hole(d, depth){
    translate([0,0,plate_t - depth])
        cylinder(h=depth+0.6, d=d);
}

module socket_front_features(){
    translate([0,0,plate_t - recess_d])
        cube([recess_w, recess_h, recess_d+0.6], center=true);

    translate([0, earth_offset_y, 0]) pin_hole(earth_d, pin_depth);
    translate([-pin_spacing/2, live_offset_y, 0]) pin_hole(live_d, pin_depth);
    translate([ pin_spacing/2, live_offset_y, 0]) pin_hole(live_d, pin_depth);

    translate([0, screw_offset_y, 0]) screw_hole();
    translate([0,-screw_offset_y, 0]) screw_hole();
}

module socket_body(){
    translate([0,0,plate_t])
        cube([socket_body_w, socket_body_h, socket_body_t], center=false);
}

module backbox(){
    translate([-backbox_w/2, -backbox_h/2, plate_t])
        cube([backbox_w, backbox_h, backbox_d], center=false);
}

difference(){
    union(){
        rounded_plate(plate_w, plate_h, plate_t, face_r);
        socket_body();
        backbox();
    }
    socket_front_features();
}
